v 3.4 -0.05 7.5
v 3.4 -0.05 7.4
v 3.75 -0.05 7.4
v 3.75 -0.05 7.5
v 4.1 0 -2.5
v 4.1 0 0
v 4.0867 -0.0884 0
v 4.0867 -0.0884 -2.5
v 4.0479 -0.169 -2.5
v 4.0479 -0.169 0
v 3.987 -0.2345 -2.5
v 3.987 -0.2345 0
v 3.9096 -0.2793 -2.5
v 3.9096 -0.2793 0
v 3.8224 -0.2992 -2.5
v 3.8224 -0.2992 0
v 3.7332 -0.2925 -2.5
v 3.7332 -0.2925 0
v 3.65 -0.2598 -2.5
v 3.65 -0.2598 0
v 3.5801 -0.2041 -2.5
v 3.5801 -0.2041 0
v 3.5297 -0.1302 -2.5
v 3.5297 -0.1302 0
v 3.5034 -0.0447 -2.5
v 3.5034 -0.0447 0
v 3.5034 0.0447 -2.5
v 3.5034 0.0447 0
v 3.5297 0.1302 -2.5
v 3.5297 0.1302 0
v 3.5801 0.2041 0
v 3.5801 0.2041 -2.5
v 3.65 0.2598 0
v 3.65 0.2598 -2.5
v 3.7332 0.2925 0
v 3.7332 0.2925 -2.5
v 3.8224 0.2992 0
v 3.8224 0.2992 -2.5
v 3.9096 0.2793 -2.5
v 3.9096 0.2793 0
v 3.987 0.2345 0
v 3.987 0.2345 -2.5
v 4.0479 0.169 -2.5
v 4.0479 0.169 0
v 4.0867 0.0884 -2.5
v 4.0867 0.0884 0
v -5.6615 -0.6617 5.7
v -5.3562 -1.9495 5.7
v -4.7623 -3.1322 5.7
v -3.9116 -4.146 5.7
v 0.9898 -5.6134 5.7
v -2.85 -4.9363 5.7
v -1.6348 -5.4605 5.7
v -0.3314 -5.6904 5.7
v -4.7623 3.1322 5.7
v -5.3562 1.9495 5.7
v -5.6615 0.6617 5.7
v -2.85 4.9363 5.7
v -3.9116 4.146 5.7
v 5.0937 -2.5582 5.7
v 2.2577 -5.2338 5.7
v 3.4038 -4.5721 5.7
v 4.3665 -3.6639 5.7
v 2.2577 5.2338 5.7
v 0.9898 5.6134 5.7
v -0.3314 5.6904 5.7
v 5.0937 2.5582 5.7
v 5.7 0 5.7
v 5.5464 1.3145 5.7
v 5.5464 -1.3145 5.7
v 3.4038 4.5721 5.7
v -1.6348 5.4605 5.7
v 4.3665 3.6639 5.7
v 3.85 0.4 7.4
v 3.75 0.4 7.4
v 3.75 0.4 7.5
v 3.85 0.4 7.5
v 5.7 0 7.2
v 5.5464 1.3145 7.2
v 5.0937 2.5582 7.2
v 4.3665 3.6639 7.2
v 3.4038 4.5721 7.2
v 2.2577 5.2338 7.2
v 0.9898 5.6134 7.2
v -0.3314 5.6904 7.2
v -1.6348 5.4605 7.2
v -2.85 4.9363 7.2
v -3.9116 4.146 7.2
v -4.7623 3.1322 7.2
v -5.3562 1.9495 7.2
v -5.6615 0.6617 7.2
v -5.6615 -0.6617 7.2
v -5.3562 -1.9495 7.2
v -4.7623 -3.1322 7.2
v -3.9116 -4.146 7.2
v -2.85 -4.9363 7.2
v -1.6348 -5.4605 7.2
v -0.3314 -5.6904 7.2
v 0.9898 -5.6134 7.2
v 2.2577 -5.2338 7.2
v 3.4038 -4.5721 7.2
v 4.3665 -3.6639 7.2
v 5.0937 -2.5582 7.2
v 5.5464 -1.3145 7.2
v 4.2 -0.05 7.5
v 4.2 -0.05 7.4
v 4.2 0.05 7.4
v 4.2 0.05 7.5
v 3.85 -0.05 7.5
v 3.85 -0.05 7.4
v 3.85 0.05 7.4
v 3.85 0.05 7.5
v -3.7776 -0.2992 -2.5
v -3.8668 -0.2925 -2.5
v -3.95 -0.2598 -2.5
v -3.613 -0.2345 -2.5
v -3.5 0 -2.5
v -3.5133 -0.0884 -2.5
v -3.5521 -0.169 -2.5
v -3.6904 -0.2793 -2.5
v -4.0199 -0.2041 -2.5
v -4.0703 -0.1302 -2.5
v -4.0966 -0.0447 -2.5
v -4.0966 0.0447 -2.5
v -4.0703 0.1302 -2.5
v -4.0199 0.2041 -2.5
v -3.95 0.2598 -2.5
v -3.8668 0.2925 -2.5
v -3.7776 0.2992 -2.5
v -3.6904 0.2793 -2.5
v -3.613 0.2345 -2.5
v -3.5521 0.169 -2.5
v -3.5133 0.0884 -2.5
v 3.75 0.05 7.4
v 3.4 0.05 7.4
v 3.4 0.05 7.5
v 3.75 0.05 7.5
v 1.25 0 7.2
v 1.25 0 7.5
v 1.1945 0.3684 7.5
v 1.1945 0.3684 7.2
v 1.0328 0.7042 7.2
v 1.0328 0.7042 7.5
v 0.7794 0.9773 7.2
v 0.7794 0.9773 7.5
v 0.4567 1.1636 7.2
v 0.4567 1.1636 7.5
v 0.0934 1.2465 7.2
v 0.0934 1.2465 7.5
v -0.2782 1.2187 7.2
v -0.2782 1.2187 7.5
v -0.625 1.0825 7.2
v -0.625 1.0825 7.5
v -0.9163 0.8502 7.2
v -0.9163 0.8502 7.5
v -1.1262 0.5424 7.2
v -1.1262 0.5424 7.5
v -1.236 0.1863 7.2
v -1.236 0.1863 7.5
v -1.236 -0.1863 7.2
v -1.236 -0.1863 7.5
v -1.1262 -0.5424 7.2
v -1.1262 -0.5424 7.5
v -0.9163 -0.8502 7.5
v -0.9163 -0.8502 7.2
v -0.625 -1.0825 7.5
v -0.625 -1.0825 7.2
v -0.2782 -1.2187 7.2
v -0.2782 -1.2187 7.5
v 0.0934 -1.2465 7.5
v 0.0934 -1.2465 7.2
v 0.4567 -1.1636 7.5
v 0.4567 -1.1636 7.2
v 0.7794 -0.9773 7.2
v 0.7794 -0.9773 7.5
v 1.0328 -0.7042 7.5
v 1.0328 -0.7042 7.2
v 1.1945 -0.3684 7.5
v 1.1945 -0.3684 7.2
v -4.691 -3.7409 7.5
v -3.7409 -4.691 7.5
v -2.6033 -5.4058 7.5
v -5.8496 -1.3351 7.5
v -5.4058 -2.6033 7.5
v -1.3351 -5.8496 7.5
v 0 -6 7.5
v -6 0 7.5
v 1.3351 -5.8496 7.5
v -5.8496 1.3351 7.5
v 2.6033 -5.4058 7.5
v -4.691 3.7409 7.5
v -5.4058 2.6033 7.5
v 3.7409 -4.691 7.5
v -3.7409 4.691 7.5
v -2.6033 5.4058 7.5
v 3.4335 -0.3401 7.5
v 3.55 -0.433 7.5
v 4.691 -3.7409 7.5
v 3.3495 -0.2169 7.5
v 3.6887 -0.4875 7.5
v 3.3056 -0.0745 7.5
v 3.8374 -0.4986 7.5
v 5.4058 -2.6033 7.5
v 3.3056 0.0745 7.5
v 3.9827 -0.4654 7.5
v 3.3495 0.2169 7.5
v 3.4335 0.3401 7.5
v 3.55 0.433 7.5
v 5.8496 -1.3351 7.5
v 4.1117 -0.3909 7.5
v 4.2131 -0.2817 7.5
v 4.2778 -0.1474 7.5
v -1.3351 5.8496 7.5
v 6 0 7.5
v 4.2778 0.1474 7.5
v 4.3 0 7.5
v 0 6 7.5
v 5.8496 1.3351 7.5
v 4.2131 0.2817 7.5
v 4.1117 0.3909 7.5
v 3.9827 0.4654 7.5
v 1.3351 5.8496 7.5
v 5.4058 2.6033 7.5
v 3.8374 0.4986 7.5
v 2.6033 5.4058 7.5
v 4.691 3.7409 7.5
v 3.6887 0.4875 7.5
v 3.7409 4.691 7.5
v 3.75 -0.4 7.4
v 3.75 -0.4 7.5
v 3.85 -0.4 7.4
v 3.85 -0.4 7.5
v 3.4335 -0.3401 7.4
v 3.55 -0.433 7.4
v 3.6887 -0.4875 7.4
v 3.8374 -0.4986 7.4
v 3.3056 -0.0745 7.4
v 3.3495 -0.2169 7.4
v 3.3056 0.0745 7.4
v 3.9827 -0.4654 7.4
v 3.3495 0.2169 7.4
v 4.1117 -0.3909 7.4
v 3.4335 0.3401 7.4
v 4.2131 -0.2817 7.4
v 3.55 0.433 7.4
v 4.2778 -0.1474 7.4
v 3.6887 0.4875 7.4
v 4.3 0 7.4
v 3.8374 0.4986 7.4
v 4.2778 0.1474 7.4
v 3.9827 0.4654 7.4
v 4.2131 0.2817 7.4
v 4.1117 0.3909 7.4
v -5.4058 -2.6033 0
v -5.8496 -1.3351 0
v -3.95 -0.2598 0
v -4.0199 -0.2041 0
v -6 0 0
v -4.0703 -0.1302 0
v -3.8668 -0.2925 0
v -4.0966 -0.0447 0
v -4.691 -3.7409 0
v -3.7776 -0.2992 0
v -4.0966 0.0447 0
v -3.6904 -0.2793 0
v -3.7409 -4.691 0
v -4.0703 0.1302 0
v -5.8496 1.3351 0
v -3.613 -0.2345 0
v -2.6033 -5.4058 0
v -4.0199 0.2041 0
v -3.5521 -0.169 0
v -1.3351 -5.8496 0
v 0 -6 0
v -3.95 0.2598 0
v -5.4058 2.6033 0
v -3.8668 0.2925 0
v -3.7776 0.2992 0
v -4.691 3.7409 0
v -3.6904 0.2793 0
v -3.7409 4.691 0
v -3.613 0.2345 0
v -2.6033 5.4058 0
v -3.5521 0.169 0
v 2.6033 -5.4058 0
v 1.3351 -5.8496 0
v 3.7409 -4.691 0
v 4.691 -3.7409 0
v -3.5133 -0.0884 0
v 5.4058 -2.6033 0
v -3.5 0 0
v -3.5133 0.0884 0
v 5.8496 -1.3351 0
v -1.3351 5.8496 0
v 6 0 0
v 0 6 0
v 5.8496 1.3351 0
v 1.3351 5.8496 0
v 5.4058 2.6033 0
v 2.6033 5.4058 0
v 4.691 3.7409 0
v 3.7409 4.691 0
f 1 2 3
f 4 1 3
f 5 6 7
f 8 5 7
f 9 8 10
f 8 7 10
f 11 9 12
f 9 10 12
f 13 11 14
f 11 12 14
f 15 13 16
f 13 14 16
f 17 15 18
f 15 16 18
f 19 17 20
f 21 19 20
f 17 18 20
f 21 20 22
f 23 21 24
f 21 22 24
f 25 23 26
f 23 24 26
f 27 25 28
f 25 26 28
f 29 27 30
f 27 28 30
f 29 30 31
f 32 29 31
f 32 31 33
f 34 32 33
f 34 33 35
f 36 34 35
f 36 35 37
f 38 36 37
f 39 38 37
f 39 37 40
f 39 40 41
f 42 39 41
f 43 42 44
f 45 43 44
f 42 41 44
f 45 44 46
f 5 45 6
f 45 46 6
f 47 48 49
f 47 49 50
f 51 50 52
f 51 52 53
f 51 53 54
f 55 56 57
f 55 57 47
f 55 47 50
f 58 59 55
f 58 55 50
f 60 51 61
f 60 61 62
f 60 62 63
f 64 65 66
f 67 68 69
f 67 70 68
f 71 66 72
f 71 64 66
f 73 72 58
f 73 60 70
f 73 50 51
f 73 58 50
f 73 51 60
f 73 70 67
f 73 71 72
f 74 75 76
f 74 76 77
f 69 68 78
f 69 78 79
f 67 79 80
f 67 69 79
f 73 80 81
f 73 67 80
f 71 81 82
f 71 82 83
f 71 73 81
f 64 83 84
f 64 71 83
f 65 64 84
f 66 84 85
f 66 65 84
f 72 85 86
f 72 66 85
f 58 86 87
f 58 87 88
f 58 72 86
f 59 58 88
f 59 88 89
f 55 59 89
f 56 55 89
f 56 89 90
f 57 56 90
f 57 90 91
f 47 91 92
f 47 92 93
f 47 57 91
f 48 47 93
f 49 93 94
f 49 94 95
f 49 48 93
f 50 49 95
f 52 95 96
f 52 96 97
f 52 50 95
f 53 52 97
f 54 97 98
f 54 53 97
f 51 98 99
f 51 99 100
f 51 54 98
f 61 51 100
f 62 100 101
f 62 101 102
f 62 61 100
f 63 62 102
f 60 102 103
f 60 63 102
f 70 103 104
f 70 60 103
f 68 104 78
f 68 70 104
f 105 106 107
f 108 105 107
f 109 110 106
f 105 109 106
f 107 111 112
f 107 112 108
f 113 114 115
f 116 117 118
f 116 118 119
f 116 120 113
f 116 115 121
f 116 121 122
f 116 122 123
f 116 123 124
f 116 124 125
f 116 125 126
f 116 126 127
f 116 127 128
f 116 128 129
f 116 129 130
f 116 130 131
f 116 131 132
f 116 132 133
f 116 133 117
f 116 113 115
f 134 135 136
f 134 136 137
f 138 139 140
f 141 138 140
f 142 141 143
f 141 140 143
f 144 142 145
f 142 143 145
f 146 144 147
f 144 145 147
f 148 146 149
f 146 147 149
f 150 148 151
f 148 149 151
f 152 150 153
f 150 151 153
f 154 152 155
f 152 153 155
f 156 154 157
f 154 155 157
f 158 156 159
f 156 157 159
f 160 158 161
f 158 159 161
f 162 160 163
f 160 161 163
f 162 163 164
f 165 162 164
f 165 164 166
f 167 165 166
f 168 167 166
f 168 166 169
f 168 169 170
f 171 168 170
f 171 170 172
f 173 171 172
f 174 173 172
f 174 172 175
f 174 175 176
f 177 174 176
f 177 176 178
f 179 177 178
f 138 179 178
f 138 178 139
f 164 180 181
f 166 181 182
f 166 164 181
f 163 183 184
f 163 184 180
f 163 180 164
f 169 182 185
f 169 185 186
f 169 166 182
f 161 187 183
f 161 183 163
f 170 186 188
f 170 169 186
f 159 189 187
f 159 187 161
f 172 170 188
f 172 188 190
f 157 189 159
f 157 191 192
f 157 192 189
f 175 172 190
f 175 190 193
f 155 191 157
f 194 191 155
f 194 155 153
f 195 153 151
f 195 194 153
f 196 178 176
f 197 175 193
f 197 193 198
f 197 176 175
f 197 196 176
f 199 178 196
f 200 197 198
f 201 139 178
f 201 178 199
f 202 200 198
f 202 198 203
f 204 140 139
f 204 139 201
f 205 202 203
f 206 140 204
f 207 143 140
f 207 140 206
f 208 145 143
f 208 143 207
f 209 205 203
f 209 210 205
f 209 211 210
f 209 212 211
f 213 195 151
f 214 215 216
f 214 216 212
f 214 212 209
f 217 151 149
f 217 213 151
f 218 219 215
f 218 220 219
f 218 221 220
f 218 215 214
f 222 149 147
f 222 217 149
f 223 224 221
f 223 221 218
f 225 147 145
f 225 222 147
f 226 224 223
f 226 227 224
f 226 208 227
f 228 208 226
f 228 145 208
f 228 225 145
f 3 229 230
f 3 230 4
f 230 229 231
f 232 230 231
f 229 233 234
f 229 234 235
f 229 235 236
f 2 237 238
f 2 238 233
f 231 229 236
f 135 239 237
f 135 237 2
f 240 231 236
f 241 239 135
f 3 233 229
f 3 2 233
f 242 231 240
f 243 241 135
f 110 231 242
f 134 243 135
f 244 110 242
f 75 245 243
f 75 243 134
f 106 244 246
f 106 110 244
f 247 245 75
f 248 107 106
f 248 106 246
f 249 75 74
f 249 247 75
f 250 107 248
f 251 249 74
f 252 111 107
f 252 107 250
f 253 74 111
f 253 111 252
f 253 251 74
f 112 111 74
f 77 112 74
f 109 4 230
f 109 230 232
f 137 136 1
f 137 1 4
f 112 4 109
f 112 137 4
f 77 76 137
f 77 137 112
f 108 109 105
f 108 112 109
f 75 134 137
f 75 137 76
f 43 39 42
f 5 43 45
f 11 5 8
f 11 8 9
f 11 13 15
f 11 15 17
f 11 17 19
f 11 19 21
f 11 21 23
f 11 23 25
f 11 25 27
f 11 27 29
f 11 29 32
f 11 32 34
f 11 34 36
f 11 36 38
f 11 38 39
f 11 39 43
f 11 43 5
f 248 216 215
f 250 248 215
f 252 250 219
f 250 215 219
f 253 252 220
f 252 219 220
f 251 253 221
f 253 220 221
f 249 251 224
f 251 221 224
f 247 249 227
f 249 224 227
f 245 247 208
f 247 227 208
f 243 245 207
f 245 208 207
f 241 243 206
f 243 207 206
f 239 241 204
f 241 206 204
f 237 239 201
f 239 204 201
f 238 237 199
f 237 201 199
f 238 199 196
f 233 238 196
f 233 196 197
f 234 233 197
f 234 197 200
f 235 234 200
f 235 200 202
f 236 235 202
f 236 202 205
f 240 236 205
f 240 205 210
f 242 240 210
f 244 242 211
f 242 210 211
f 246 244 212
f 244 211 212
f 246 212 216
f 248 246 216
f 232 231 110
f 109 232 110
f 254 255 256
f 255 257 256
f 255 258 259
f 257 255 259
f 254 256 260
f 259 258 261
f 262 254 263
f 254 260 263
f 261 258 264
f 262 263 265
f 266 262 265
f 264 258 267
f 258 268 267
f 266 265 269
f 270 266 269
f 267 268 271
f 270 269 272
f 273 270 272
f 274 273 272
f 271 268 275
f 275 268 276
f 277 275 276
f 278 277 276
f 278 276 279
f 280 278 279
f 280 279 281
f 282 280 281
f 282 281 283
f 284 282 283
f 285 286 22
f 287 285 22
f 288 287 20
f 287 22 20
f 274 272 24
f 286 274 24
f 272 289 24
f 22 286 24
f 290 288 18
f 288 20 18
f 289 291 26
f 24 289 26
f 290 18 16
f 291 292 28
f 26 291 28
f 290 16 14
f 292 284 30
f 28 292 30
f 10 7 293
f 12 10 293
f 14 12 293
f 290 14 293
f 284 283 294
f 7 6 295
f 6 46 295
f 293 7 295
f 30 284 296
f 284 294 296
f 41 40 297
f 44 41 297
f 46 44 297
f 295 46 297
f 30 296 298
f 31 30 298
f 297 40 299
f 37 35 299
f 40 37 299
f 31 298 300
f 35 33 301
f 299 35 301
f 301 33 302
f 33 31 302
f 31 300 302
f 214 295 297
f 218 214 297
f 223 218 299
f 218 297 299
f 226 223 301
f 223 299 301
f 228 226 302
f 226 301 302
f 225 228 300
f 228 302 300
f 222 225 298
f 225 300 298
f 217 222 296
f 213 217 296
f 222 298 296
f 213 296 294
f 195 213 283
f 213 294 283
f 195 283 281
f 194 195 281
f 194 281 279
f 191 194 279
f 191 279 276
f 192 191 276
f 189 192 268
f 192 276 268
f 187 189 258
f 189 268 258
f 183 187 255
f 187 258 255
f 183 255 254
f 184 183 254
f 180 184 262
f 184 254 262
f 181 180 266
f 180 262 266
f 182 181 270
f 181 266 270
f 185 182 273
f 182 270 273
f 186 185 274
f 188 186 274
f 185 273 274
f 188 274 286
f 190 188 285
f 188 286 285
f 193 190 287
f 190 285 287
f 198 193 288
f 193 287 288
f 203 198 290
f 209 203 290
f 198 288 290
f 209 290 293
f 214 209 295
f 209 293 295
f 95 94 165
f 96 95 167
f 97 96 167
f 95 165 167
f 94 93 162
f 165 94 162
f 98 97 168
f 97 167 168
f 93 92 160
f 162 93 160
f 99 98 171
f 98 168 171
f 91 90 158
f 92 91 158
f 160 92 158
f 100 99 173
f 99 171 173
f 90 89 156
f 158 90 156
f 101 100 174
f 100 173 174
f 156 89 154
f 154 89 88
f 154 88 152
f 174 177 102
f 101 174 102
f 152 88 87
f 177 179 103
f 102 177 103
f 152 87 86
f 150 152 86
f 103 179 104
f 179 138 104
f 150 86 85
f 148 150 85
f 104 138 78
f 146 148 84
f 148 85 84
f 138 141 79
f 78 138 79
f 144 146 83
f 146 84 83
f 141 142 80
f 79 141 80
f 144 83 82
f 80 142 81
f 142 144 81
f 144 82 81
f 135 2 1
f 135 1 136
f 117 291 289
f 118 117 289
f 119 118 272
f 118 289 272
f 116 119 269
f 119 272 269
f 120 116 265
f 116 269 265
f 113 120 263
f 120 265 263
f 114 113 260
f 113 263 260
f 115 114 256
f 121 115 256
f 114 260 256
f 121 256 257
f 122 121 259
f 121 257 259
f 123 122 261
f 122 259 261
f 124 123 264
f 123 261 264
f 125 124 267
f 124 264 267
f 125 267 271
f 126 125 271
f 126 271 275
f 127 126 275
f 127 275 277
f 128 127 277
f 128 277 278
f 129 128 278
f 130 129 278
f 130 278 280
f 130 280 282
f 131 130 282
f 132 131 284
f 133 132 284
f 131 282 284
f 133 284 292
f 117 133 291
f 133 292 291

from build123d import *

# Parameters (mm, degrees)
SKETCH1_R           = 6
BOSS_EXTRUDE1_DEPTH = 7.5
SKETCH2_R           = 0.3
BOSS_EXTRUDE2_DEPTH = 2.5
SKETCH3_R           = 1.25
CUT_EXTRUDE1_DEPTH  = 1.8
SKETCH4_R           = 5.7
CUT_EXTRUDE2_DEPTH  = 1.5
SKETCH5_R           = 0.5
CUT_EXTRUDE3_DEPTH  = 0.1
SKETCH6_W           = 0.35
SKETCH6_H           = 0.1
SKETCH6_W_2         = 0.1
SKETCH6_H_2         = 0.35
BOSS_EXTRUDE3_DEPTH = 0.1


with BuildPart() as part:
    # Sketch1 → Boss-Extrude1 (new body)
    with BuildSketch(Plane.XY):
        Circle(SKETCH1_R)
    extrude(amount=BOSS_EXTRUDE1_DEPTH)

    # Sketch2 → Boss-Extrude2 (add)
    with BuildSketch(Plane(origin=(0, 0, 0), x_dir=(-1, 0, 0), z_dir=(0, 0, -1))):
        with Locations(Location((3.8, 0, 0), (0, 0, 180))):
            Circle(SKETCH2_R)
        with Locations(Location((-3.8, 0, 0), (0, 0, 180))):
            Circle(SKETCH2_R)
    extrude(amount=BOSS_EXTRUDE2_DEPTH)

    # Sketch3 → Cut-Extrude1 (cut)
    with BuildSketch(Plane.XY.offset(7.5)):
        Circle(SKETCH3_R)
    extrude(amount=-CUT_EXTRUDE1_DEPTH, mode=Mode.SUBTRACT)

    # Sketch4 → Cut-Extrude2 (cut)
    with BuildSketch(Plane.XY.offset(5.7)):
        Circle(SKETCH4_R)
    extrude(amount=CUT_EXTRUDE2_DEPTH, mode=Mode.SUBTRACT)

    # Sketch5 → Cut-Extrude3 (cut)
    with BuildSketch(Plane.XY.offset(7.5)):
        with Locations((3.8, 0)):
            Circle(SKETCH5_R)
    extrude(amount=-CUT_EXTRUDE3_DEPTH, mode=Mode.SUBTRACT)

    # Sketch6 → Boss-Extrude3 (add)
    with BuildSketch(Plane.XY.offset(7.4)):
        with Locations((4.025, 0)):
            Rectangle(SKETCH6_W, SKETCH6_H)
        with Locations((3.575, 0)):
            Rectangle(SKETCH6_W, SKETCH6_H)
        with Locations((3.8, 0.225)):
            Rectangle(SKETCH6_W_2, SKETCH6_H_2)
        with Locations((3.8, -0.225)):
            Rectangle(SKETCH6_W_2, SKETCH6_H_2)
        with Locations((3.8, 0)):
            Rectangle(SKETCH6_W_2, SKETCH6_H)
    extrude(amount=BOSS_EXTRUDE3_DEPTH)


solid = part.part
